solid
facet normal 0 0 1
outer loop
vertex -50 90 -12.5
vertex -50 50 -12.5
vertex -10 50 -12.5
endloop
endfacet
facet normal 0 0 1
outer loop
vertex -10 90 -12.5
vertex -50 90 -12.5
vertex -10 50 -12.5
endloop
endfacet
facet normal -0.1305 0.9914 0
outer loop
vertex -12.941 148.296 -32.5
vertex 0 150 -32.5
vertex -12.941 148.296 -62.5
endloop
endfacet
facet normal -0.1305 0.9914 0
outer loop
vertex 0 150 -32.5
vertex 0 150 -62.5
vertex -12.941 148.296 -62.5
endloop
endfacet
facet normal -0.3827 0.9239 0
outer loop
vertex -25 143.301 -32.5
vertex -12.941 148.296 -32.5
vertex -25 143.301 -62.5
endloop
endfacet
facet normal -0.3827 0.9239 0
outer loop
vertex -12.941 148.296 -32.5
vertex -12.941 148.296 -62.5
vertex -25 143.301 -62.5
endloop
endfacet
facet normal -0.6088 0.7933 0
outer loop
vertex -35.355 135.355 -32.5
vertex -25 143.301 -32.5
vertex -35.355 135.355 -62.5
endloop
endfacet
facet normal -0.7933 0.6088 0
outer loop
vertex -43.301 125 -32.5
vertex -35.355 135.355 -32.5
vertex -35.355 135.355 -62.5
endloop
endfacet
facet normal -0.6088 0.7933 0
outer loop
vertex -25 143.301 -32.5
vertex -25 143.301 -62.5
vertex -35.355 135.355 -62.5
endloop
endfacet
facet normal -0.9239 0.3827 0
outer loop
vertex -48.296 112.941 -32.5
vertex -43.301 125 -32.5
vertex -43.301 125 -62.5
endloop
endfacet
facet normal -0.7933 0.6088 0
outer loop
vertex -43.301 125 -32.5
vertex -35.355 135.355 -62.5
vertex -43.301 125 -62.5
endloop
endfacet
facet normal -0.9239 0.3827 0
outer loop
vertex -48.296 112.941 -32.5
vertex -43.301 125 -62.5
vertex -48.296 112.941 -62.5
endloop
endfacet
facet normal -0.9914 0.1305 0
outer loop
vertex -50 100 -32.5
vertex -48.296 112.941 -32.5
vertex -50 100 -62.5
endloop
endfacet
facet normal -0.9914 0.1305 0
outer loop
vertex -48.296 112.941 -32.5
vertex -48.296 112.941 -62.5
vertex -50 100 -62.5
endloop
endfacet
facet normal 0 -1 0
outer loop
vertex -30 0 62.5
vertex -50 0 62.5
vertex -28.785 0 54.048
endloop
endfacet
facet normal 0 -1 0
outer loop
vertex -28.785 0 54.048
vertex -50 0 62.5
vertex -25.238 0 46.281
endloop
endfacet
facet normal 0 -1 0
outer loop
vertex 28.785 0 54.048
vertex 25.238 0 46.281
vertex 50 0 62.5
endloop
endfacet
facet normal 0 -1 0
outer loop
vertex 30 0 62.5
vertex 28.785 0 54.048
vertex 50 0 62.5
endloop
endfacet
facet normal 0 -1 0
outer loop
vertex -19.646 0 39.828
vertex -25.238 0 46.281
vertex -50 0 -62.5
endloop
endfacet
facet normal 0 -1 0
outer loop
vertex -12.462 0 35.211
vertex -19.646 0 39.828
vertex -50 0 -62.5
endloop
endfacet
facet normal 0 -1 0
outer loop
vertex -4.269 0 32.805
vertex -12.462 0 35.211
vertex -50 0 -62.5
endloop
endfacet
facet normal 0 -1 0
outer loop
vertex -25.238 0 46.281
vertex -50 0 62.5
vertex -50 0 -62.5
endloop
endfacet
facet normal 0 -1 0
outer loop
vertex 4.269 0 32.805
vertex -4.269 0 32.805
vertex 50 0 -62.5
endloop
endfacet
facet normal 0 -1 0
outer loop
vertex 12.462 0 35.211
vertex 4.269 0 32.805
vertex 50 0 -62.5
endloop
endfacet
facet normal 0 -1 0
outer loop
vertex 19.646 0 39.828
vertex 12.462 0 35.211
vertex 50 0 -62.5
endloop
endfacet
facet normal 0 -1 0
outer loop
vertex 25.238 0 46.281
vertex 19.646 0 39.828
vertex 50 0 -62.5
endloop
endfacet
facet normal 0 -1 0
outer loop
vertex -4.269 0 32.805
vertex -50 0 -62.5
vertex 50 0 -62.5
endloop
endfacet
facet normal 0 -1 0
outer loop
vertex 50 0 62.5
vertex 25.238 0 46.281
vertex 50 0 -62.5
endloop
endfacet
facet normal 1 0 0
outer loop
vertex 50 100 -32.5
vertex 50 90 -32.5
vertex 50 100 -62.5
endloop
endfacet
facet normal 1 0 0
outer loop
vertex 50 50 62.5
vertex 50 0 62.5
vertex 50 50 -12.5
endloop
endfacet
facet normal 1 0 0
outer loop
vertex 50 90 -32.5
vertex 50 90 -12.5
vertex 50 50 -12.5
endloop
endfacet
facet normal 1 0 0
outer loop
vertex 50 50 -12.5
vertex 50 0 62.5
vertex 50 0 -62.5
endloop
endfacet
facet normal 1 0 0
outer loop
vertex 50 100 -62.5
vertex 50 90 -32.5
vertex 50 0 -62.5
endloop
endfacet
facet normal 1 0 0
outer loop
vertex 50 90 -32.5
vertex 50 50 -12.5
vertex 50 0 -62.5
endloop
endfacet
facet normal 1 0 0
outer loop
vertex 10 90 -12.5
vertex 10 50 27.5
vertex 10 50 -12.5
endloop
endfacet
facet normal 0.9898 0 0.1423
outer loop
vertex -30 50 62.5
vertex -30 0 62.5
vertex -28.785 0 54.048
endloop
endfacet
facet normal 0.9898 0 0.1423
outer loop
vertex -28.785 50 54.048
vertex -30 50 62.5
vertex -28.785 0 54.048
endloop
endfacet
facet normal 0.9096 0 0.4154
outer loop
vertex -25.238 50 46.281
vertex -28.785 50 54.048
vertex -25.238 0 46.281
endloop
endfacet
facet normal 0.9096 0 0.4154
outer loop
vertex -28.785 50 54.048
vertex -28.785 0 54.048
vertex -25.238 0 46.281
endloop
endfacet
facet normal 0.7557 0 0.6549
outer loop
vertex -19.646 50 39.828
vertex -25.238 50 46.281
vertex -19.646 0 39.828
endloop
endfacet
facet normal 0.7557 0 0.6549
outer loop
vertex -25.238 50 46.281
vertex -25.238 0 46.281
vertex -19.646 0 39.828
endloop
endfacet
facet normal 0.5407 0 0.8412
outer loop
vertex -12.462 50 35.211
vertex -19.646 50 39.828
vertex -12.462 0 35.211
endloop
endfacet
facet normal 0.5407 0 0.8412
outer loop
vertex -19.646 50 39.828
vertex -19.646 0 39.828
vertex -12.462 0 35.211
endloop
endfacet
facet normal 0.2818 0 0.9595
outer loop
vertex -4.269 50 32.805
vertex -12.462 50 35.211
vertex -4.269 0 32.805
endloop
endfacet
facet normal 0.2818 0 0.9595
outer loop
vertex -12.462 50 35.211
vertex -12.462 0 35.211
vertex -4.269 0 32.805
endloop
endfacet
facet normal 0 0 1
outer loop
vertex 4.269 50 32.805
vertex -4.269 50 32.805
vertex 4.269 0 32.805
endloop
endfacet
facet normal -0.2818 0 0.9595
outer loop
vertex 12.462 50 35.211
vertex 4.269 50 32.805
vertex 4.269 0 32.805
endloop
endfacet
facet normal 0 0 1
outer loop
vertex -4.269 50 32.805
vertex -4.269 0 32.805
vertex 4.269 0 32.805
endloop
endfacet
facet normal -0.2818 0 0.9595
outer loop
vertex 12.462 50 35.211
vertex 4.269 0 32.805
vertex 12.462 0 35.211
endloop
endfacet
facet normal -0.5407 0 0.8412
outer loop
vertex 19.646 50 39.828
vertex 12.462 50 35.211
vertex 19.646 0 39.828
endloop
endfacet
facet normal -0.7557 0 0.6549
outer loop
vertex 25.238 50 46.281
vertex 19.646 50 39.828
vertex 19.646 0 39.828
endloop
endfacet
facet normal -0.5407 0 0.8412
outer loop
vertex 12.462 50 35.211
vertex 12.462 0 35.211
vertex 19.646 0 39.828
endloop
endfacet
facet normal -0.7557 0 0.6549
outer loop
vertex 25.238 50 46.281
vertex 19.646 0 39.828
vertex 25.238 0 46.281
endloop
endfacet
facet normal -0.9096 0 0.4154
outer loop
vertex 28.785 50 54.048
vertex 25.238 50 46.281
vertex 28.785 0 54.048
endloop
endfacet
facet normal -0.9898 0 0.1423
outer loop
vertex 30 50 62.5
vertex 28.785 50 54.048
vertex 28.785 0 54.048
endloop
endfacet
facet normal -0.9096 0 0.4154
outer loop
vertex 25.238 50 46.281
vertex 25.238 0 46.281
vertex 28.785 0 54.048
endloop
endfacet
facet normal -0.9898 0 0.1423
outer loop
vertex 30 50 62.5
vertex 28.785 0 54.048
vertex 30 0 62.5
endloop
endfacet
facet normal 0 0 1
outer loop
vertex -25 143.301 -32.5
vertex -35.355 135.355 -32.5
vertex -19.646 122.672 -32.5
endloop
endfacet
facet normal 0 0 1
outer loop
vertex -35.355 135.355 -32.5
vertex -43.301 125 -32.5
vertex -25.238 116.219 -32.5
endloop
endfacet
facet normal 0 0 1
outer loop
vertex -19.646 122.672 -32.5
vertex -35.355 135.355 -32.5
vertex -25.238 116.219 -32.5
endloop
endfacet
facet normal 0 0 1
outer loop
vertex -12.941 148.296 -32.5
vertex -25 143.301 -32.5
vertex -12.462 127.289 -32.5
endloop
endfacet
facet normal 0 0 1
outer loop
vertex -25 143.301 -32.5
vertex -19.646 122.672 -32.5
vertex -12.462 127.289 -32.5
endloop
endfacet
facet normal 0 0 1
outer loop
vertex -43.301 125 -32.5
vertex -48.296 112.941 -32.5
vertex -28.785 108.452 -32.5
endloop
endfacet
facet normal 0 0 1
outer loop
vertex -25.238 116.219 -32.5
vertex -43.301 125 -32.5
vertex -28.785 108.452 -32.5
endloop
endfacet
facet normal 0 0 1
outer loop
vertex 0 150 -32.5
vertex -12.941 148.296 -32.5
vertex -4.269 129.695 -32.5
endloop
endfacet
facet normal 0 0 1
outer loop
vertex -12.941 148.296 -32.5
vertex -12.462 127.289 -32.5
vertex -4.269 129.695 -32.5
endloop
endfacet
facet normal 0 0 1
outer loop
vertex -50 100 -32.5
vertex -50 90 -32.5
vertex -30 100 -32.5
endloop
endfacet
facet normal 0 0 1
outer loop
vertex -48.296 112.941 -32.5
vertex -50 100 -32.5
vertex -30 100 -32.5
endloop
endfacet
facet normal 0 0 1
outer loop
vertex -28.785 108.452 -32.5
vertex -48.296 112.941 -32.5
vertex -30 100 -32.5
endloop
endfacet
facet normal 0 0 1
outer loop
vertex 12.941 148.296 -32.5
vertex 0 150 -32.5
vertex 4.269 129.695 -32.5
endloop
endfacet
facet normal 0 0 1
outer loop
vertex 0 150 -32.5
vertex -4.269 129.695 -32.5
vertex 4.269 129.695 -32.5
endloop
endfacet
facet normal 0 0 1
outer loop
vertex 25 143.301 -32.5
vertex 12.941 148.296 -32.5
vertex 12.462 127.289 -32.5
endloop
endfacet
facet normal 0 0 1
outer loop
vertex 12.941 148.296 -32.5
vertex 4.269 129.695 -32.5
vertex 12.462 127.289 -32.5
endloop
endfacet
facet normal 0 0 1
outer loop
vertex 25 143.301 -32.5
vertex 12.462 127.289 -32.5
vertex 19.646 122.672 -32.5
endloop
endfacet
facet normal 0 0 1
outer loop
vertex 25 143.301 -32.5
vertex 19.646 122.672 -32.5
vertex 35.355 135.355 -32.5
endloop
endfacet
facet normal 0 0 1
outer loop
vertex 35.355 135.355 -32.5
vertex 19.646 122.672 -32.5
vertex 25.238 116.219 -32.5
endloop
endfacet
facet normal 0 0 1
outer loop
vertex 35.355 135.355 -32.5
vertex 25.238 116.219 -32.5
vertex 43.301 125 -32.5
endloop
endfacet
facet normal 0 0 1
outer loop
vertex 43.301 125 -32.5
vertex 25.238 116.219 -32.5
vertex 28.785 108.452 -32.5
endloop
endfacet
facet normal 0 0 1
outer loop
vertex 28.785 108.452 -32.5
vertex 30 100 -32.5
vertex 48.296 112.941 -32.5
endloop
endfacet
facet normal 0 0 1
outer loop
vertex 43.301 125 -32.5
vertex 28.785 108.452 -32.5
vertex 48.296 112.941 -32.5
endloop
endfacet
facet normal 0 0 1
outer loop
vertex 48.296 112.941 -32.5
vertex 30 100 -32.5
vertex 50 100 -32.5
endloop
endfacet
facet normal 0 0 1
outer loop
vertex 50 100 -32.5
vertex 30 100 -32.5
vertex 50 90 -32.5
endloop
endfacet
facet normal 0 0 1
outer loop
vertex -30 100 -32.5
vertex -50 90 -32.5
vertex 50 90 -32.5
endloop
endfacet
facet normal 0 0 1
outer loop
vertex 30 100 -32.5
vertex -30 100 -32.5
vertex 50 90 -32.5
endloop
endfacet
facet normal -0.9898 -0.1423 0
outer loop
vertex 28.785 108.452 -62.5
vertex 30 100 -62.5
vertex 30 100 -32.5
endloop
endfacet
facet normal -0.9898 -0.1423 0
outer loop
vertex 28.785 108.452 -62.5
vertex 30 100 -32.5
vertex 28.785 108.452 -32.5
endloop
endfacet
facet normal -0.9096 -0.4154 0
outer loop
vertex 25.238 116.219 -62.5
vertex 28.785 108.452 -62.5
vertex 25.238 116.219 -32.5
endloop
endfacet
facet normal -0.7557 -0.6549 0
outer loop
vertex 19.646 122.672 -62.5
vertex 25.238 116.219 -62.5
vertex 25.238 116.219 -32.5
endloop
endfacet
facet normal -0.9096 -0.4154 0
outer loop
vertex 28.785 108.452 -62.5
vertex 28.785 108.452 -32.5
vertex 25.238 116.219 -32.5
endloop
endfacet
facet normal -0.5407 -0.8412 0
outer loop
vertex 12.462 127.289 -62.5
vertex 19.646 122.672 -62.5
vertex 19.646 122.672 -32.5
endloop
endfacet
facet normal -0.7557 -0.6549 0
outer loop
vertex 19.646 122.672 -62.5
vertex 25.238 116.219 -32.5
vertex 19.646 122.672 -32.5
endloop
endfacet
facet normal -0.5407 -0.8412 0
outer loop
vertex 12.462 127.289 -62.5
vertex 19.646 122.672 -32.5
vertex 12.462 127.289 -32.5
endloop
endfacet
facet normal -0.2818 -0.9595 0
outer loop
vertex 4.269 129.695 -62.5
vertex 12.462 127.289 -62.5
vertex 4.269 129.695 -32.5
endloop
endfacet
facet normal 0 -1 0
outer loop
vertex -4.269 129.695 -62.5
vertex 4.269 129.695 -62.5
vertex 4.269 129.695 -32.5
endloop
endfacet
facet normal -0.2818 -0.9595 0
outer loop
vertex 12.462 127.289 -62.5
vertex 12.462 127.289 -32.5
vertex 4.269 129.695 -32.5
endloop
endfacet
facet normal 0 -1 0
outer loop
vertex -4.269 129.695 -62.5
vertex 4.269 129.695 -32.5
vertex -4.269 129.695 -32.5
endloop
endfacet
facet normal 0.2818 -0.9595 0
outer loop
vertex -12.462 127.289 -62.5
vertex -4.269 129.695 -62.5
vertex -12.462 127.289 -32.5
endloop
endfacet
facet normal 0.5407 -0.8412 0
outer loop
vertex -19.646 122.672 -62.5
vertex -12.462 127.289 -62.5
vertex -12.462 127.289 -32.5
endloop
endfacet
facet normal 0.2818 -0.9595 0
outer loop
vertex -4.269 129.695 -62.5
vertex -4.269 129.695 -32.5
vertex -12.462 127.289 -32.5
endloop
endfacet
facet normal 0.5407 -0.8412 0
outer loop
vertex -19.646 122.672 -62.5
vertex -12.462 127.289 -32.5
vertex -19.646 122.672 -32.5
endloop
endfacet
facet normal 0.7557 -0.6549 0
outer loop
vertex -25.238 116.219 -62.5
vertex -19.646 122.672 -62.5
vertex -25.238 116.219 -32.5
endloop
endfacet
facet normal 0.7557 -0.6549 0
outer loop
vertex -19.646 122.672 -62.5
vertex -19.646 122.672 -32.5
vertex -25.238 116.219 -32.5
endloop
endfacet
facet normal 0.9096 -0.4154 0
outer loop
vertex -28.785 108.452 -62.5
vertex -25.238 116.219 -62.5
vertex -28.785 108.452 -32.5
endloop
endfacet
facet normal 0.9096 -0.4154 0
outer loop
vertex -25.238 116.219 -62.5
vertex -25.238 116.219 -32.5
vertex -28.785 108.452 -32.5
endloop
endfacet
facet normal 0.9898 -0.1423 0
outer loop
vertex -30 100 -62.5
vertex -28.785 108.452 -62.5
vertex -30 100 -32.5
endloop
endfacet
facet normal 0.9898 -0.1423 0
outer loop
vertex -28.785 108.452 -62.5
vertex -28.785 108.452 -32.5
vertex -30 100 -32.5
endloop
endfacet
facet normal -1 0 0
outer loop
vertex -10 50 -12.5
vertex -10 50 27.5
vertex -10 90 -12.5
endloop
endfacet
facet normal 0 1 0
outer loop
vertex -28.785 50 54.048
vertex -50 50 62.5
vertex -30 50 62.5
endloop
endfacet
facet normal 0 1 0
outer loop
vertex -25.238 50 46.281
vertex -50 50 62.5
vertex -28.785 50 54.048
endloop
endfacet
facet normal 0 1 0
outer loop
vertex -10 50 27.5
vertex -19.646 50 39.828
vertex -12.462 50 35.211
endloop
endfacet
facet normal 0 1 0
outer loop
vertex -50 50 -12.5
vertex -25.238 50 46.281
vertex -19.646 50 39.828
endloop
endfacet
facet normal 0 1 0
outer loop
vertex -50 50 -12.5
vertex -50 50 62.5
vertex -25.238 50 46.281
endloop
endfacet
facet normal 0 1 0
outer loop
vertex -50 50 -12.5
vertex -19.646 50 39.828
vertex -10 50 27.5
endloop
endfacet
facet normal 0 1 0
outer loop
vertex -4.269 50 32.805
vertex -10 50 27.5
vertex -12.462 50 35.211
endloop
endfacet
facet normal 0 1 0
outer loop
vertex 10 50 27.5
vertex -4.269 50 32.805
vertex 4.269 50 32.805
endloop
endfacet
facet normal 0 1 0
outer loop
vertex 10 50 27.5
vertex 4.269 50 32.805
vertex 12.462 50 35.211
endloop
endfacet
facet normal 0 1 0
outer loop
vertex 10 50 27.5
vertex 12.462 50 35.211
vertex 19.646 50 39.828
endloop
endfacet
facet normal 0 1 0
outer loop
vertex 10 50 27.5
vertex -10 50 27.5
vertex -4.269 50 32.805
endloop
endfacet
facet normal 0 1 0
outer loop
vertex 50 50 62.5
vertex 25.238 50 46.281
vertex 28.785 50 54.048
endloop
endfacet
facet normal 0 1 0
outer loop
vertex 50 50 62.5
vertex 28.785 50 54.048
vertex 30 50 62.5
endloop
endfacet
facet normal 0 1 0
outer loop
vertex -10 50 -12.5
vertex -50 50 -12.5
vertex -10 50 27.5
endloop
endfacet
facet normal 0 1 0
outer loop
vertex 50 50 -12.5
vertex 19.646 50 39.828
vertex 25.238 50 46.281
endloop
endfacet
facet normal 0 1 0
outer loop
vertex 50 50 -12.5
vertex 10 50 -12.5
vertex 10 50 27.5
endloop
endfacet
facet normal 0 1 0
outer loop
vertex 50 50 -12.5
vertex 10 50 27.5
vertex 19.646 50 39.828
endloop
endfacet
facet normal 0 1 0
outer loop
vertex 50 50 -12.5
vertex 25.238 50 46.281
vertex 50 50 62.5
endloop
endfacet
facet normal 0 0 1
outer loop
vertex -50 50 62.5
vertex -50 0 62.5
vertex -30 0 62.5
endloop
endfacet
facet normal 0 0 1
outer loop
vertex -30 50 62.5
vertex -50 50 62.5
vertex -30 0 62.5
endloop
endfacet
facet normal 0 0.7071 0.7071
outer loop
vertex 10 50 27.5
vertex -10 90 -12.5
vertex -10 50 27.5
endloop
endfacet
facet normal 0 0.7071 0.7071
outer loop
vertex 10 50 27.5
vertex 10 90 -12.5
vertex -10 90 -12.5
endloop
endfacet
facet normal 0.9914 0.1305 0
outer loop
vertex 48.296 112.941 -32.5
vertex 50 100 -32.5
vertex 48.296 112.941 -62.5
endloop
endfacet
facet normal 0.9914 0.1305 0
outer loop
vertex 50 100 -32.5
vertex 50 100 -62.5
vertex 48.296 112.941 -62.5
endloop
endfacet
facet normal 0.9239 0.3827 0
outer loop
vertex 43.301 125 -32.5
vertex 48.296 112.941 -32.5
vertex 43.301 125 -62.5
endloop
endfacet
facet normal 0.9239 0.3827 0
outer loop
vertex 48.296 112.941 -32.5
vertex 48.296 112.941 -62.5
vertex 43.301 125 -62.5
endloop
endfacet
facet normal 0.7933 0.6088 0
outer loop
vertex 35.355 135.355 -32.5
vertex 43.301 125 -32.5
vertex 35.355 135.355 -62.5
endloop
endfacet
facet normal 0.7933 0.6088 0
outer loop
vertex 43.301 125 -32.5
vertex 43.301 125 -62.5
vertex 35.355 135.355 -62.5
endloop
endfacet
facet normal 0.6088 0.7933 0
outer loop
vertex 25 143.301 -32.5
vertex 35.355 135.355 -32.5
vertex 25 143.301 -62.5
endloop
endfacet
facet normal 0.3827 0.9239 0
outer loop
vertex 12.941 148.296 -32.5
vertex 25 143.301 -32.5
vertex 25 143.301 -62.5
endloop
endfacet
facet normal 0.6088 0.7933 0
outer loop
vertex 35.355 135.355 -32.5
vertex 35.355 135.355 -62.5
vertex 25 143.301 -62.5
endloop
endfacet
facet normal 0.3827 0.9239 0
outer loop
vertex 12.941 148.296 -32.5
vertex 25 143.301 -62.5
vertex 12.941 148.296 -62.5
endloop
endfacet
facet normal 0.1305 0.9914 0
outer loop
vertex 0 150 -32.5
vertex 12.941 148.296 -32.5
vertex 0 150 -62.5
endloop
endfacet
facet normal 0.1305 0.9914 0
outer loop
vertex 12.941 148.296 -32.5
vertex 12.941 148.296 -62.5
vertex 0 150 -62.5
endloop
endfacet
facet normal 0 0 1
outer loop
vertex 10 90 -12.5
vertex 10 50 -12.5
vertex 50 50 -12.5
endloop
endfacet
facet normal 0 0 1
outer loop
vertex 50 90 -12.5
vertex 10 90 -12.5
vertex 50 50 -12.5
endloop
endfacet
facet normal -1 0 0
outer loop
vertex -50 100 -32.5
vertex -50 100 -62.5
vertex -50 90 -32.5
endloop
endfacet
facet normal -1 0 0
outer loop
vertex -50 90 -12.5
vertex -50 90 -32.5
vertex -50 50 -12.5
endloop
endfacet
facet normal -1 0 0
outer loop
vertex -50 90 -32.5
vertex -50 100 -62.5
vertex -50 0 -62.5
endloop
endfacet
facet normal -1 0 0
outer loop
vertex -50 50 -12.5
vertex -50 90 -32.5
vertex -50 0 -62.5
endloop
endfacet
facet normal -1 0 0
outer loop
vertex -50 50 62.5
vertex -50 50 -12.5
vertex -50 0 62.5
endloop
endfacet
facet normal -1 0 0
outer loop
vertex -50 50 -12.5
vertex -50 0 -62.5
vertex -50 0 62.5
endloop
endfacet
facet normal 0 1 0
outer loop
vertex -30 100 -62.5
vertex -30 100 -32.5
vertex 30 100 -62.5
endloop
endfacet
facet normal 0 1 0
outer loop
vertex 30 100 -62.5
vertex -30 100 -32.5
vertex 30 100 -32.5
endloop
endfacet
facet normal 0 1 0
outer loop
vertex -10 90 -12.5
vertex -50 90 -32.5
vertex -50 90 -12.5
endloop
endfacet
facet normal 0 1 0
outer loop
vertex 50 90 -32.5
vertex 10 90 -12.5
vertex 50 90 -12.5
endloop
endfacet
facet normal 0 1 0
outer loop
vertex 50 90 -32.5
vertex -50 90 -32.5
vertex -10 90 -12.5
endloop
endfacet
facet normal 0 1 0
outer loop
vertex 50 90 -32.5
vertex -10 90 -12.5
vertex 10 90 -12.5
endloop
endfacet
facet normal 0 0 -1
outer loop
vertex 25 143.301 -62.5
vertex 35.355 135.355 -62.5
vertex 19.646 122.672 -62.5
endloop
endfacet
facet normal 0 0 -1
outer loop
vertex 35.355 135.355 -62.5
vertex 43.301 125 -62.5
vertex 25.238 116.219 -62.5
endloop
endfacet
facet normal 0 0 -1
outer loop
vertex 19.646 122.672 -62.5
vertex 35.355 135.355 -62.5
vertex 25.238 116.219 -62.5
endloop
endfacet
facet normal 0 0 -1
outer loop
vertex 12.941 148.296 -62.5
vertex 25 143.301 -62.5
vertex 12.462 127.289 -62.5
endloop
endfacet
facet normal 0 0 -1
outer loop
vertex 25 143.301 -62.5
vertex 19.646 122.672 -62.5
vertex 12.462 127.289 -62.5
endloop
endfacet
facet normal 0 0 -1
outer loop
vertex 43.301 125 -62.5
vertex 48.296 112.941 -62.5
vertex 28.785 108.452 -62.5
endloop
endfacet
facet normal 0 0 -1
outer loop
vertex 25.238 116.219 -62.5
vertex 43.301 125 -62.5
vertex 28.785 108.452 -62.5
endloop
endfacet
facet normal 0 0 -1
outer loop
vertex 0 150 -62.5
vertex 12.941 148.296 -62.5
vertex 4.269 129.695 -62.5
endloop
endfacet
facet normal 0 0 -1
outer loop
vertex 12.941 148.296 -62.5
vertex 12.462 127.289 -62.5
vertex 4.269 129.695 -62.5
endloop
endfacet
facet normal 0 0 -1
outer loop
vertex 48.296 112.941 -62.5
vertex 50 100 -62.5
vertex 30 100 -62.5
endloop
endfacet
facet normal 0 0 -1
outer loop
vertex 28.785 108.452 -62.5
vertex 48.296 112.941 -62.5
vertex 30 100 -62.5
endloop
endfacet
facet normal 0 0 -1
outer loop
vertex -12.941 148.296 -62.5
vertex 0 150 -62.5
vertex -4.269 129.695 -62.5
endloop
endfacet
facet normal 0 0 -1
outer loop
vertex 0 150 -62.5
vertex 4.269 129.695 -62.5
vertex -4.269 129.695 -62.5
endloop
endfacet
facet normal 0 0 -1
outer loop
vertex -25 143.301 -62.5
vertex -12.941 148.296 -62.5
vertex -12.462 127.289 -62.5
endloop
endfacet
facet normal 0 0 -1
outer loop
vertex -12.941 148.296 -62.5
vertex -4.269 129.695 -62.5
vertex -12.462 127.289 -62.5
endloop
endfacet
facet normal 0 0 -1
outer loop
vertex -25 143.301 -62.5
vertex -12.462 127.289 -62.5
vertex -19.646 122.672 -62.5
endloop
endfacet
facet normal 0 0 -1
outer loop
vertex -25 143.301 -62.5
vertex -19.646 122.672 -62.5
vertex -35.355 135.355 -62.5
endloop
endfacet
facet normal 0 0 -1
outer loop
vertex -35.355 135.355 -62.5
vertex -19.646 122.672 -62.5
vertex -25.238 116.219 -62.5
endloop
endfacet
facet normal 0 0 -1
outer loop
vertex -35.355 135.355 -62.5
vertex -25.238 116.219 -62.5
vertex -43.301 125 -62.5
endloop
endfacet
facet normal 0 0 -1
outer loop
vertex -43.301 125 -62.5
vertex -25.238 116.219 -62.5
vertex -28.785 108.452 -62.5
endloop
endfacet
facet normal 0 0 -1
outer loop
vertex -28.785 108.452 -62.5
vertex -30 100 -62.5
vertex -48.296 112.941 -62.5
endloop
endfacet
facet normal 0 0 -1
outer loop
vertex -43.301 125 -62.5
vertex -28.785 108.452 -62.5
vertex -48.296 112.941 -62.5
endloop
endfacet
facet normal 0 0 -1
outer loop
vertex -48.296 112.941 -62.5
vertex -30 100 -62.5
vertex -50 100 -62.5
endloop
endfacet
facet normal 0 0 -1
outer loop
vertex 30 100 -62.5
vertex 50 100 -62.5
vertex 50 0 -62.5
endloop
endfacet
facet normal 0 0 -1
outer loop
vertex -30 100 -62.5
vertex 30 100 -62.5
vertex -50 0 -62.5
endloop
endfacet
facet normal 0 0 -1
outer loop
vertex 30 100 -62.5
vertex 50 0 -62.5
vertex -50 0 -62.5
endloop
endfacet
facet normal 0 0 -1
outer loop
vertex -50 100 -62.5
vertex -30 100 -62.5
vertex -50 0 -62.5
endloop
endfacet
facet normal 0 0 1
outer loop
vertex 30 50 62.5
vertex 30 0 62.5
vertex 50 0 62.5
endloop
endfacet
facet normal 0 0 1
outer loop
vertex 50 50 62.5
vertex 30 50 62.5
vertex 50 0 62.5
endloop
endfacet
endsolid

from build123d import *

# Parameters (mm, degrees)
BOSS_EXTRUDE1_DEPTH = 50
SKETCH2_W           = 100
SKETCH2_H           = 50
BOSS_EXTRUDE2_DEPTH = 90
SKETCH3_W           = 100
SKETCH3_H           = 30
BOSS_EXTRUDE3_DEPTH = 150
BOSS_EXTRUDE4_DEPTH = 10
FILLET1_R           = 50
CUT_EXTRUDE1_DEPTH  = 171.018381359


with BuildPart() as part:
    # Sketch1 → Boss-Extrude1 (new body)
    with BuildSketch(Plane(origin=(0, 0, 0), x_dir=(1, 0, 0), z_dir=(0, 1, 0))):
        with BuildLine():
            Line((30, -62.5), (50, -62.5))
            Line((50, -62.5), (50, 62.5))
            Line((50, 62.5), (-50, 62.5))
            Line((-50, 62.5), (-50, -62.5))
            Line((-50, -62.5), (-30, -62.5))
            ThreePointArc((-30, -62.5), (0, -32.5), (30, -62.5))
        make_face()
    extrude(amount=BOSS_EXTRUDE1_DEPTH)

    # Sketch2 → Boss-Extrude2 (add)
    with BuildSketch(Plane(origin=(0, 0, 0), x_dir=(1, 0, 0), z_dir=(0, 1, 0))):
        with Locations((0, 37.5)):
            Rectangle(SKETCH2_W, SKETCH2_H)
    extrude(amount=BOSS_EXTRUDE2_DEPTH)

    # Sketch3 → Boss-Extrude3 (add)
    with BuildSketch(Plane(origin=(0, 0, 0), x_dir=(1, 0, 0), z_dir=(0, 1, 0))):
        with Locations((0, 47.5)):
            Rectangle(SKETCH3_W, SKETCH3_H)
    extrude(amount=BOSS_EXTRUDE3_DEPTH)

    # Sketch4 → Boss-Extrude4 (add, symmetric)
    with BuildSketch(Plane(origin=(0, 0, 0), x_dir=(0, 0, -1), z_dir=(1, 0, 0))):
        Polygon((12.5, 90), (-27.5, 50), (12.5, 50), align=None)
    extrude(amount=BOSS_EXTRUDE4_DEPTH, both=True)

    # Fillet1
    fillet1_edges = [part.edges().sort_by_distance(p)[0] for p in [
        (-50, 150, -47.5),
        (50, 150, -47.5),
    ]]
    fillet(fillet1_edges, radius=FILLET1_R - 0.0001)  # a hair under: the kernel refuses the full size

    # Sketch6 → Cut-Extrude1 (cut, through all)
    with BuildSketch(Plane.XY):
        with BuildLine():
            Line((-30, 100), (30, 100))
            ThreePointArc((30, 100), (0, 130), (-30, 100))
        make_face()
    extrude(amount=-CUT_EXTRUDE1_DEPTH, mode=Mode.SUBTRACT)


solid = part.part
